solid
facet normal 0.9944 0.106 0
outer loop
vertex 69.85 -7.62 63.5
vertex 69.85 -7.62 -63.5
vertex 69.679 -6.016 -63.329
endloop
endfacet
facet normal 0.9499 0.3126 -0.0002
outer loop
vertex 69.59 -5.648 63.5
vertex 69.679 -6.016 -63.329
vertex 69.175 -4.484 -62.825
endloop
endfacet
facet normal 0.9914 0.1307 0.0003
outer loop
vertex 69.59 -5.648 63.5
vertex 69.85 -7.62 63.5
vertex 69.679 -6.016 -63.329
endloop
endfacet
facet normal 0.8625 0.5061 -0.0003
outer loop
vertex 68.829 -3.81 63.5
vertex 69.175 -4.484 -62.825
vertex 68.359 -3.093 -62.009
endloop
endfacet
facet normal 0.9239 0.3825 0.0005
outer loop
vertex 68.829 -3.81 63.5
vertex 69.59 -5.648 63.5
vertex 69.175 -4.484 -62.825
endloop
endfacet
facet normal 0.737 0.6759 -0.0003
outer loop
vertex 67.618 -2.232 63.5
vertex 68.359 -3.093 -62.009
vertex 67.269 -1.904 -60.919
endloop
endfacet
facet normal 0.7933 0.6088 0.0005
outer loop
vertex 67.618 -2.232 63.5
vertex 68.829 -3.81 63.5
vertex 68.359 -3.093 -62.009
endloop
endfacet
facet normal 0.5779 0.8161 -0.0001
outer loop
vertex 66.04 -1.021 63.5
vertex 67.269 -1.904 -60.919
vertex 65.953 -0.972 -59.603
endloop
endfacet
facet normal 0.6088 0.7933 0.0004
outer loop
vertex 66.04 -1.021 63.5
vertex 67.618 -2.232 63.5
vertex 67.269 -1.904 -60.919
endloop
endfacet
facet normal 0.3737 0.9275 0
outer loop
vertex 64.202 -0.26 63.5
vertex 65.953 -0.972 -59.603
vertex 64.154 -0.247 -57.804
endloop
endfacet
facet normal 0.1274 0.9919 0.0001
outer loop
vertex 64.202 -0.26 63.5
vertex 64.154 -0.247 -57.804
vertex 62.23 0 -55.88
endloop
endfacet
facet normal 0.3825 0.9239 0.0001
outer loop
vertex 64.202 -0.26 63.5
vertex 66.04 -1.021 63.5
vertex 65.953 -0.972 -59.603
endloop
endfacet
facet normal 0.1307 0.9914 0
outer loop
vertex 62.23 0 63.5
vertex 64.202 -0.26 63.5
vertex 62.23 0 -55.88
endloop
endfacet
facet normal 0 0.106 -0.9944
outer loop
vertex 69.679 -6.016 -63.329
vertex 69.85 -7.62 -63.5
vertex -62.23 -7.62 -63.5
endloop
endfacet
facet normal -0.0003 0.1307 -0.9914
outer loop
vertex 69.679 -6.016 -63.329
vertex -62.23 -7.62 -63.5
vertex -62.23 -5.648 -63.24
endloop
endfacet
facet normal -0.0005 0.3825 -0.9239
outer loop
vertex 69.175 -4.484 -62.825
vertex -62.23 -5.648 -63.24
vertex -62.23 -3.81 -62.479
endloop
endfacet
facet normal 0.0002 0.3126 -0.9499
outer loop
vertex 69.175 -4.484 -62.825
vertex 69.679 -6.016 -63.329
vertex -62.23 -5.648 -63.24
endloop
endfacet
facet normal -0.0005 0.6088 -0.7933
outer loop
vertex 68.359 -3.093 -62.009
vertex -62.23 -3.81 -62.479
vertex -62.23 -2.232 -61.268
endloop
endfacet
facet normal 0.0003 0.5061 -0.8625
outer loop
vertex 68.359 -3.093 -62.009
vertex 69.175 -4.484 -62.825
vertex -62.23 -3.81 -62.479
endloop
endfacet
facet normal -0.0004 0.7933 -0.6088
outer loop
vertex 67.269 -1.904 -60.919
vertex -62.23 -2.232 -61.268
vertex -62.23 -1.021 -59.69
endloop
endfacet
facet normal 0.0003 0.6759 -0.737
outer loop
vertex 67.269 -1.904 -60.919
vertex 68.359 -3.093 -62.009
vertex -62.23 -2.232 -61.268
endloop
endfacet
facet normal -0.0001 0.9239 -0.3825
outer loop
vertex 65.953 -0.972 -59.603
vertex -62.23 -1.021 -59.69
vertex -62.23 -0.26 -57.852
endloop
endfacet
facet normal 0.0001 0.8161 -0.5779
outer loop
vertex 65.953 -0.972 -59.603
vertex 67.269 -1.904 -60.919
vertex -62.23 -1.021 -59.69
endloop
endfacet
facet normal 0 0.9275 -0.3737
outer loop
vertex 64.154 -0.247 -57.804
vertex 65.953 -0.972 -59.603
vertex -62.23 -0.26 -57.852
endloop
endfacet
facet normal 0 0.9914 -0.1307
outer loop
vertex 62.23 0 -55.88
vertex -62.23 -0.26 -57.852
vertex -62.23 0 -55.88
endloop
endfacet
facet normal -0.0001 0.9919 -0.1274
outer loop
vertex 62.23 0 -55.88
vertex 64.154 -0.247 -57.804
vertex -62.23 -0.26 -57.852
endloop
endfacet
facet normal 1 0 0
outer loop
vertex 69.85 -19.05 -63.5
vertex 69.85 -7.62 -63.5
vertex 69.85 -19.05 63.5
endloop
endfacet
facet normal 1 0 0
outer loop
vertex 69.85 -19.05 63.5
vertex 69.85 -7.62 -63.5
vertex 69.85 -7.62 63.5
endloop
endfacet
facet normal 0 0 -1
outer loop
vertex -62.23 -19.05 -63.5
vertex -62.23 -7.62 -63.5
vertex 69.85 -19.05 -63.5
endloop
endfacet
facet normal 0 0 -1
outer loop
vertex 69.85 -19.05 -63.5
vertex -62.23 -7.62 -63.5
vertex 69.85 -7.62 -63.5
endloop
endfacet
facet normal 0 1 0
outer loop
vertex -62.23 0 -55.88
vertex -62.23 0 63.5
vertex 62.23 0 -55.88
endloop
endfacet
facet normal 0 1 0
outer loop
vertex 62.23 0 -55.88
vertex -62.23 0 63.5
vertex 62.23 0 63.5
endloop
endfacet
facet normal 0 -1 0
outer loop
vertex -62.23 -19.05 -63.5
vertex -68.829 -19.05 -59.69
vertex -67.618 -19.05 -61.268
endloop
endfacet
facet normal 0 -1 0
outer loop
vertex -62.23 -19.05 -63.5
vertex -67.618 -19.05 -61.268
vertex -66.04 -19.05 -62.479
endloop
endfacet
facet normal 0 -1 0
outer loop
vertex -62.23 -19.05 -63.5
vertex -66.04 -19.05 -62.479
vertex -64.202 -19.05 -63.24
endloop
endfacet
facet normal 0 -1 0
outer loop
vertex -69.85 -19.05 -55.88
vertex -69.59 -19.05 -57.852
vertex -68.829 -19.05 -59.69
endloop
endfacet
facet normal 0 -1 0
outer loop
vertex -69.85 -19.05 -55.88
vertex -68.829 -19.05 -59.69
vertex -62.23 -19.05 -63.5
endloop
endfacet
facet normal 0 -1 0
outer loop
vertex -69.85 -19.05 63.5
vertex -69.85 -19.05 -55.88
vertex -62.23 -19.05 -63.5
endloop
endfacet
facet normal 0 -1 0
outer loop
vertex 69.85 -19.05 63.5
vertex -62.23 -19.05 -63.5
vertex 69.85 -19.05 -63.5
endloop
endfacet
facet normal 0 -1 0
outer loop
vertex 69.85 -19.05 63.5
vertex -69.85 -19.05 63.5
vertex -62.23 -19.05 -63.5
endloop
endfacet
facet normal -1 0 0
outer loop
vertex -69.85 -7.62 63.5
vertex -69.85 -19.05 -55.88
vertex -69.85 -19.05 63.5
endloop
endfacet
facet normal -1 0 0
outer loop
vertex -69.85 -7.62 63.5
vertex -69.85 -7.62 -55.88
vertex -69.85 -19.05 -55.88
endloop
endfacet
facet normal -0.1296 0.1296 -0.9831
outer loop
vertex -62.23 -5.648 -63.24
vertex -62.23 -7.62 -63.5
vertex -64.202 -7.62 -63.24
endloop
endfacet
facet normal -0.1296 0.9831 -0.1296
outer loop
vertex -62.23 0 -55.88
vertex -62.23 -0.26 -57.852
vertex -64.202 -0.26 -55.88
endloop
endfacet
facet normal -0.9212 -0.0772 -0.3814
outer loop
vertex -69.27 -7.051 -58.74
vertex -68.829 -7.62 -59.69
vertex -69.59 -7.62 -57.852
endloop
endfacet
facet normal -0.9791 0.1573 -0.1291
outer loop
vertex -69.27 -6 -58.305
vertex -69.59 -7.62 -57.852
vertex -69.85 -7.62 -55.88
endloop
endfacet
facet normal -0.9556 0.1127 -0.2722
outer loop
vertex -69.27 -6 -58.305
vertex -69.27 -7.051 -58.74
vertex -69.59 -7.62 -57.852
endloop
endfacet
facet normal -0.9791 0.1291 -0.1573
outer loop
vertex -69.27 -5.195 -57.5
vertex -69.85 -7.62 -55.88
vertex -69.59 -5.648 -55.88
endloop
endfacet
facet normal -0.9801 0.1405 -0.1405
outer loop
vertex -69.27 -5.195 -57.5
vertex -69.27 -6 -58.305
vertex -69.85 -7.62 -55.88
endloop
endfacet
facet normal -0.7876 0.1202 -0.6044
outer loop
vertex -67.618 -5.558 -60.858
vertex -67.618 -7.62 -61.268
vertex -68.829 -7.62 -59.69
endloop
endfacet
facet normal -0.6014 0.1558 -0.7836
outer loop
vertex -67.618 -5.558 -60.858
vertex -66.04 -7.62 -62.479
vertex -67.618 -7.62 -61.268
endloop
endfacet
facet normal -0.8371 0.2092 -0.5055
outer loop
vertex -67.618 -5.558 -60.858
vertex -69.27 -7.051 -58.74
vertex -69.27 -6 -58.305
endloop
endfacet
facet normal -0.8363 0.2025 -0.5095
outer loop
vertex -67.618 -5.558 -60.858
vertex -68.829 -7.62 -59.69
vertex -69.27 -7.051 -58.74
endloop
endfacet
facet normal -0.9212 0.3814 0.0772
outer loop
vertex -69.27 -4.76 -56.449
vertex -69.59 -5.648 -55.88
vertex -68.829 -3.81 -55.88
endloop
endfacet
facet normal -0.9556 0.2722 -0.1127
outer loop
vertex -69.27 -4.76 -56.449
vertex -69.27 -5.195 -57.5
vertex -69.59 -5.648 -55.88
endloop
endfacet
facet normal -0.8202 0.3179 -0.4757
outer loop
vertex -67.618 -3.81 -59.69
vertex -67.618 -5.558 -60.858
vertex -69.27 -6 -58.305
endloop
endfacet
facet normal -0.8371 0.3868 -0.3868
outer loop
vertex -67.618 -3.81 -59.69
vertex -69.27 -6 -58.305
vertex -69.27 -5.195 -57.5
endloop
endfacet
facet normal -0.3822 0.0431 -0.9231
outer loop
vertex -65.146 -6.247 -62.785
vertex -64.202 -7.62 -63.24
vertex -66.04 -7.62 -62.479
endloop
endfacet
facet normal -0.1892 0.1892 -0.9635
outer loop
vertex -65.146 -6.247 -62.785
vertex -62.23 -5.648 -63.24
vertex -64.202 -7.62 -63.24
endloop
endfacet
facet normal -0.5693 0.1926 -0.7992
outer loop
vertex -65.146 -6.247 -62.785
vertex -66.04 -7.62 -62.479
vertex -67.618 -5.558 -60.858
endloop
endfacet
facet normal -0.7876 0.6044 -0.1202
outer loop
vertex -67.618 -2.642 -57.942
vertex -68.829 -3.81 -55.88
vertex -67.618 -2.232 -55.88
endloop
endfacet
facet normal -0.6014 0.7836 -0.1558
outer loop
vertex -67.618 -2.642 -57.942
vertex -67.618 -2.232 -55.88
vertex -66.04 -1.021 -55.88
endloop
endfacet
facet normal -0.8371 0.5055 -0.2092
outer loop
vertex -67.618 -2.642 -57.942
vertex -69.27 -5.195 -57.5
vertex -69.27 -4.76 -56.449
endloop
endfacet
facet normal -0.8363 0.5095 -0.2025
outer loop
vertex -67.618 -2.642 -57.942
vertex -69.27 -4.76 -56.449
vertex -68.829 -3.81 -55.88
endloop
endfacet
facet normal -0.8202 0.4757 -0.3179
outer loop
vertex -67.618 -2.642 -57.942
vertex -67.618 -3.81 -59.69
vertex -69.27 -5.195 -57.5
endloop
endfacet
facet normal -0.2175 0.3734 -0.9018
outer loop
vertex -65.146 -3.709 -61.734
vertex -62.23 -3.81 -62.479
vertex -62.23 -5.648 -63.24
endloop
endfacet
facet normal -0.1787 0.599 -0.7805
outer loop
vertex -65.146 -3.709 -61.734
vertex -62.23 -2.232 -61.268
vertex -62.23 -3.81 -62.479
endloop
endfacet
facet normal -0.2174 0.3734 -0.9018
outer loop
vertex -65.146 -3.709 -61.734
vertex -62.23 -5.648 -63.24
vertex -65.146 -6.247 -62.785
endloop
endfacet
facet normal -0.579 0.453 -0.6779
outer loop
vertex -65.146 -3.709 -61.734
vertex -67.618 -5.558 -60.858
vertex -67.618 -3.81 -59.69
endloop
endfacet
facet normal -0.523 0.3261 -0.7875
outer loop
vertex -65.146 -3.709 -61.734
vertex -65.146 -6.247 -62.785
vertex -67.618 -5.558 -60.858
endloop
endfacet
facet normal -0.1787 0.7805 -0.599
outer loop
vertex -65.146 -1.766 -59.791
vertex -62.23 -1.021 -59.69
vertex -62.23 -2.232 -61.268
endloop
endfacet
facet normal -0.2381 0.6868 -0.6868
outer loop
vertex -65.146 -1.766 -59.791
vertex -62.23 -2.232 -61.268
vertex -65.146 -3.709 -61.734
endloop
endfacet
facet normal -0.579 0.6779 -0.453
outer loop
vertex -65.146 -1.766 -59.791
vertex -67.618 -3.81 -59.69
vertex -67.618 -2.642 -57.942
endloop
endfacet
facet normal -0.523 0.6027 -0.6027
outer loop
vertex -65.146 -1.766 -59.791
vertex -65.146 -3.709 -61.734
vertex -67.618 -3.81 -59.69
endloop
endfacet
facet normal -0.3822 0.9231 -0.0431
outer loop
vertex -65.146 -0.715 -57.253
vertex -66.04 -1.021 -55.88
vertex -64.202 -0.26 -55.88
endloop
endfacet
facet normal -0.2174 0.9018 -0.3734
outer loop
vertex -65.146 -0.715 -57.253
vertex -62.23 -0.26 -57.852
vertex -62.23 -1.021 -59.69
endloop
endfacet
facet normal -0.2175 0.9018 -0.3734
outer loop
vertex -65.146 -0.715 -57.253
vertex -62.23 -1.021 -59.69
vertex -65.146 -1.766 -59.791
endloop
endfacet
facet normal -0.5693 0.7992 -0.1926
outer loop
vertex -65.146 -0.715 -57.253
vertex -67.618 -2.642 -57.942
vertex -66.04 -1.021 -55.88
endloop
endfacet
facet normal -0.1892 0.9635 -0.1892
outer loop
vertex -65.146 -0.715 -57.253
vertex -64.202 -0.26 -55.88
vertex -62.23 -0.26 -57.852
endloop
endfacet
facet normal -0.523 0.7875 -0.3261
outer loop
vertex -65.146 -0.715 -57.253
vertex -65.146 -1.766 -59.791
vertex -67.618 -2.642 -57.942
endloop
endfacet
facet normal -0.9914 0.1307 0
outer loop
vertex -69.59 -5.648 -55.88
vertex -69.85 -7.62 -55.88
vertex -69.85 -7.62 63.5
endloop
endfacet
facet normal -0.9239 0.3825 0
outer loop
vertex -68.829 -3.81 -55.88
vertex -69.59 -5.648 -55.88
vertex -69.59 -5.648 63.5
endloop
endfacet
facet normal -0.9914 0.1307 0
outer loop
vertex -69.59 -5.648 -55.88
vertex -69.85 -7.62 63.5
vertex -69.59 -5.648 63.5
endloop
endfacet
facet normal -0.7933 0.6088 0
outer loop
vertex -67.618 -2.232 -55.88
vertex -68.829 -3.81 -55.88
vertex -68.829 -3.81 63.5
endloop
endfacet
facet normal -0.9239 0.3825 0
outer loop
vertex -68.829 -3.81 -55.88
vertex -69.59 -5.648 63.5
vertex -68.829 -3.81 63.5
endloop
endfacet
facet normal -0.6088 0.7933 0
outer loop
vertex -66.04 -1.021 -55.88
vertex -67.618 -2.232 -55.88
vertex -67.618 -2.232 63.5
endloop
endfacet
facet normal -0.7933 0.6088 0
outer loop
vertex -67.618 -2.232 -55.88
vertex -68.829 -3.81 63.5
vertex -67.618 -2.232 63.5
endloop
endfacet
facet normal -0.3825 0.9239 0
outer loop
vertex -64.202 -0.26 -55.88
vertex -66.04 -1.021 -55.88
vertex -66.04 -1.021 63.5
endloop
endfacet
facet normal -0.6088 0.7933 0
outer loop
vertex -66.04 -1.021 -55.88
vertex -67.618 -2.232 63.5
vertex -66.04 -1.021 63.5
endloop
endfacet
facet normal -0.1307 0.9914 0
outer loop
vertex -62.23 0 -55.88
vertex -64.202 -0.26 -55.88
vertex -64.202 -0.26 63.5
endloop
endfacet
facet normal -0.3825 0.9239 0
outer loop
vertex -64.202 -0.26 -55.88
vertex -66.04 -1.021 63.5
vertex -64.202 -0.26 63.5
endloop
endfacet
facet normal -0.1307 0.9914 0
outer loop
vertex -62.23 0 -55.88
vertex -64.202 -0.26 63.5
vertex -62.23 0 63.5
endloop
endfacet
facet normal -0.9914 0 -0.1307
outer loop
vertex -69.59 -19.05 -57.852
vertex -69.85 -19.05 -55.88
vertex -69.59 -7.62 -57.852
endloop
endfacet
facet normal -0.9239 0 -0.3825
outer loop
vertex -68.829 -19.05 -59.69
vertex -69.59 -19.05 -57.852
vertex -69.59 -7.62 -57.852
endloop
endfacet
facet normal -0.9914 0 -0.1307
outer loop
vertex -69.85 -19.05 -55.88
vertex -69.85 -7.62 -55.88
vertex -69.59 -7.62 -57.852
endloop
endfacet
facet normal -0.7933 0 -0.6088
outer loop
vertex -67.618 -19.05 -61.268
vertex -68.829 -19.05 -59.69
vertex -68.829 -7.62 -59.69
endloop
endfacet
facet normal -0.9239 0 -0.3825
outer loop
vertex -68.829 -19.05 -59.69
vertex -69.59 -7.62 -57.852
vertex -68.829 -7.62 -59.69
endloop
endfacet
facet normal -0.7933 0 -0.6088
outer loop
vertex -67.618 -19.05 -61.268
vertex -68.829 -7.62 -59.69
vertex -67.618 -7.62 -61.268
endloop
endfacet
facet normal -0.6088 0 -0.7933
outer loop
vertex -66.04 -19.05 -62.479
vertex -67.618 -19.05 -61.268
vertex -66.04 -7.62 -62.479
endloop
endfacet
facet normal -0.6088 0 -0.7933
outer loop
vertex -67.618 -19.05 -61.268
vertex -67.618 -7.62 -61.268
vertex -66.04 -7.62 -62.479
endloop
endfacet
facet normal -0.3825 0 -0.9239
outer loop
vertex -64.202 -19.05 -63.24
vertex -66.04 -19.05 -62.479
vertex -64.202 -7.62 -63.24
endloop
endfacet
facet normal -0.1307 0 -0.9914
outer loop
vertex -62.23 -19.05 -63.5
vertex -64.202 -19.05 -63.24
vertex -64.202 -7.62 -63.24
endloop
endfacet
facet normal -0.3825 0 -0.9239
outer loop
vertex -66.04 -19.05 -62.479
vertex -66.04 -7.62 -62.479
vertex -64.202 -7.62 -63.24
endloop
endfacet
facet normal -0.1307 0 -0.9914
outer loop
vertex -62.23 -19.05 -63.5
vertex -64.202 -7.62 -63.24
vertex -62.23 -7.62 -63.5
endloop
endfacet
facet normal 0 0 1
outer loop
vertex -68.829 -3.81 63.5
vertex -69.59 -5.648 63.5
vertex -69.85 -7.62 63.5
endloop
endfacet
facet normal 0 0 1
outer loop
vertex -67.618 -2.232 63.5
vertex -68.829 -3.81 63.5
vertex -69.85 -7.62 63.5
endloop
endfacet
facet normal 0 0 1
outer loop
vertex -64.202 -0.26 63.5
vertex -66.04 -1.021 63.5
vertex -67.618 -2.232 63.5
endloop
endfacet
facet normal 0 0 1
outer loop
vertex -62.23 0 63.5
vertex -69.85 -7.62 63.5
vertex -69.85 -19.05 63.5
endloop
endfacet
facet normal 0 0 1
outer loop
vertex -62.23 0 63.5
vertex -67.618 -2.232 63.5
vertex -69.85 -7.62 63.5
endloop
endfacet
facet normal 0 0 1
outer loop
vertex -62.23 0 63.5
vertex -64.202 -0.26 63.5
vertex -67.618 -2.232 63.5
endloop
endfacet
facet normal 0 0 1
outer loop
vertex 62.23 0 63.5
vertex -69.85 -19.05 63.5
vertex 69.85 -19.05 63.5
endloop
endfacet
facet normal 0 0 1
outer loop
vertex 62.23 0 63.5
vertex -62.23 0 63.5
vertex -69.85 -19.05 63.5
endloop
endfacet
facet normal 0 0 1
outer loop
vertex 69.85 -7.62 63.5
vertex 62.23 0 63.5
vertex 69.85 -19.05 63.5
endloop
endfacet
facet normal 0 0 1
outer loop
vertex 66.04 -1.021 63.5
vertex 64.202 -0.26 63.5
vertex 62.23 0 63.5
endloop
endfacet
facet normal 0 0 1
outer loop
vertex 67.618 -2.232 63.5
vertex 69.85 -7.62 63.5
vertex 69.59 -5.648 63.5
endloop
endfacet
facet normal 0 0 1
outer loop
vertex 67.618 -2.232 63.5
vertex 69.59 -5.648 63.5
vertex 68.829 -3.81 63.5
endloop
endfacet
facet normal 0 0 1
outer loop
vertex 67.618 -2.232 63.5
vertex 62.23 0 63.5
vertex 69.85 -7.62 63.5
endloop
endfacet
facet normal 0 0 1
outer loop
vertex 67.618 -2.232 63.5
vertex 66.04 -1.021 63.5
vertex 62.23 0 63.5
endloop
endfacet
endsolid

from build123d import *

# Parameters (mm, degrees)
F0_W     = 139.7
F0_H     = 127
F1_DEPTH = 19.05
F2_R     = 7.62
F3_R     = 7.62


with BuildPart() as f1:
    # F0 (on Front) → F1 (new body)
    with BuildSketch(Plane.XZ):
        Rectangle(F0_W, F0_H)
    extrude(amount=F1_DEPTH)

    # F2
    f2_edges = [f1.edges().sort_by_distance(p)[0] for p in [
        (69.85, 0, 0),
        (0, 0, -63.5),
    ]]
    fillet(f2_edges, radius=F2_R)

    # F3
    f3_edges = [f1.edges().sort_by_distance(p)[0] for p in [
        (-69.85, 0, 3.81),
    ]]
    fillet(f3_edges, radius=F3_R)


solid = f1.part
